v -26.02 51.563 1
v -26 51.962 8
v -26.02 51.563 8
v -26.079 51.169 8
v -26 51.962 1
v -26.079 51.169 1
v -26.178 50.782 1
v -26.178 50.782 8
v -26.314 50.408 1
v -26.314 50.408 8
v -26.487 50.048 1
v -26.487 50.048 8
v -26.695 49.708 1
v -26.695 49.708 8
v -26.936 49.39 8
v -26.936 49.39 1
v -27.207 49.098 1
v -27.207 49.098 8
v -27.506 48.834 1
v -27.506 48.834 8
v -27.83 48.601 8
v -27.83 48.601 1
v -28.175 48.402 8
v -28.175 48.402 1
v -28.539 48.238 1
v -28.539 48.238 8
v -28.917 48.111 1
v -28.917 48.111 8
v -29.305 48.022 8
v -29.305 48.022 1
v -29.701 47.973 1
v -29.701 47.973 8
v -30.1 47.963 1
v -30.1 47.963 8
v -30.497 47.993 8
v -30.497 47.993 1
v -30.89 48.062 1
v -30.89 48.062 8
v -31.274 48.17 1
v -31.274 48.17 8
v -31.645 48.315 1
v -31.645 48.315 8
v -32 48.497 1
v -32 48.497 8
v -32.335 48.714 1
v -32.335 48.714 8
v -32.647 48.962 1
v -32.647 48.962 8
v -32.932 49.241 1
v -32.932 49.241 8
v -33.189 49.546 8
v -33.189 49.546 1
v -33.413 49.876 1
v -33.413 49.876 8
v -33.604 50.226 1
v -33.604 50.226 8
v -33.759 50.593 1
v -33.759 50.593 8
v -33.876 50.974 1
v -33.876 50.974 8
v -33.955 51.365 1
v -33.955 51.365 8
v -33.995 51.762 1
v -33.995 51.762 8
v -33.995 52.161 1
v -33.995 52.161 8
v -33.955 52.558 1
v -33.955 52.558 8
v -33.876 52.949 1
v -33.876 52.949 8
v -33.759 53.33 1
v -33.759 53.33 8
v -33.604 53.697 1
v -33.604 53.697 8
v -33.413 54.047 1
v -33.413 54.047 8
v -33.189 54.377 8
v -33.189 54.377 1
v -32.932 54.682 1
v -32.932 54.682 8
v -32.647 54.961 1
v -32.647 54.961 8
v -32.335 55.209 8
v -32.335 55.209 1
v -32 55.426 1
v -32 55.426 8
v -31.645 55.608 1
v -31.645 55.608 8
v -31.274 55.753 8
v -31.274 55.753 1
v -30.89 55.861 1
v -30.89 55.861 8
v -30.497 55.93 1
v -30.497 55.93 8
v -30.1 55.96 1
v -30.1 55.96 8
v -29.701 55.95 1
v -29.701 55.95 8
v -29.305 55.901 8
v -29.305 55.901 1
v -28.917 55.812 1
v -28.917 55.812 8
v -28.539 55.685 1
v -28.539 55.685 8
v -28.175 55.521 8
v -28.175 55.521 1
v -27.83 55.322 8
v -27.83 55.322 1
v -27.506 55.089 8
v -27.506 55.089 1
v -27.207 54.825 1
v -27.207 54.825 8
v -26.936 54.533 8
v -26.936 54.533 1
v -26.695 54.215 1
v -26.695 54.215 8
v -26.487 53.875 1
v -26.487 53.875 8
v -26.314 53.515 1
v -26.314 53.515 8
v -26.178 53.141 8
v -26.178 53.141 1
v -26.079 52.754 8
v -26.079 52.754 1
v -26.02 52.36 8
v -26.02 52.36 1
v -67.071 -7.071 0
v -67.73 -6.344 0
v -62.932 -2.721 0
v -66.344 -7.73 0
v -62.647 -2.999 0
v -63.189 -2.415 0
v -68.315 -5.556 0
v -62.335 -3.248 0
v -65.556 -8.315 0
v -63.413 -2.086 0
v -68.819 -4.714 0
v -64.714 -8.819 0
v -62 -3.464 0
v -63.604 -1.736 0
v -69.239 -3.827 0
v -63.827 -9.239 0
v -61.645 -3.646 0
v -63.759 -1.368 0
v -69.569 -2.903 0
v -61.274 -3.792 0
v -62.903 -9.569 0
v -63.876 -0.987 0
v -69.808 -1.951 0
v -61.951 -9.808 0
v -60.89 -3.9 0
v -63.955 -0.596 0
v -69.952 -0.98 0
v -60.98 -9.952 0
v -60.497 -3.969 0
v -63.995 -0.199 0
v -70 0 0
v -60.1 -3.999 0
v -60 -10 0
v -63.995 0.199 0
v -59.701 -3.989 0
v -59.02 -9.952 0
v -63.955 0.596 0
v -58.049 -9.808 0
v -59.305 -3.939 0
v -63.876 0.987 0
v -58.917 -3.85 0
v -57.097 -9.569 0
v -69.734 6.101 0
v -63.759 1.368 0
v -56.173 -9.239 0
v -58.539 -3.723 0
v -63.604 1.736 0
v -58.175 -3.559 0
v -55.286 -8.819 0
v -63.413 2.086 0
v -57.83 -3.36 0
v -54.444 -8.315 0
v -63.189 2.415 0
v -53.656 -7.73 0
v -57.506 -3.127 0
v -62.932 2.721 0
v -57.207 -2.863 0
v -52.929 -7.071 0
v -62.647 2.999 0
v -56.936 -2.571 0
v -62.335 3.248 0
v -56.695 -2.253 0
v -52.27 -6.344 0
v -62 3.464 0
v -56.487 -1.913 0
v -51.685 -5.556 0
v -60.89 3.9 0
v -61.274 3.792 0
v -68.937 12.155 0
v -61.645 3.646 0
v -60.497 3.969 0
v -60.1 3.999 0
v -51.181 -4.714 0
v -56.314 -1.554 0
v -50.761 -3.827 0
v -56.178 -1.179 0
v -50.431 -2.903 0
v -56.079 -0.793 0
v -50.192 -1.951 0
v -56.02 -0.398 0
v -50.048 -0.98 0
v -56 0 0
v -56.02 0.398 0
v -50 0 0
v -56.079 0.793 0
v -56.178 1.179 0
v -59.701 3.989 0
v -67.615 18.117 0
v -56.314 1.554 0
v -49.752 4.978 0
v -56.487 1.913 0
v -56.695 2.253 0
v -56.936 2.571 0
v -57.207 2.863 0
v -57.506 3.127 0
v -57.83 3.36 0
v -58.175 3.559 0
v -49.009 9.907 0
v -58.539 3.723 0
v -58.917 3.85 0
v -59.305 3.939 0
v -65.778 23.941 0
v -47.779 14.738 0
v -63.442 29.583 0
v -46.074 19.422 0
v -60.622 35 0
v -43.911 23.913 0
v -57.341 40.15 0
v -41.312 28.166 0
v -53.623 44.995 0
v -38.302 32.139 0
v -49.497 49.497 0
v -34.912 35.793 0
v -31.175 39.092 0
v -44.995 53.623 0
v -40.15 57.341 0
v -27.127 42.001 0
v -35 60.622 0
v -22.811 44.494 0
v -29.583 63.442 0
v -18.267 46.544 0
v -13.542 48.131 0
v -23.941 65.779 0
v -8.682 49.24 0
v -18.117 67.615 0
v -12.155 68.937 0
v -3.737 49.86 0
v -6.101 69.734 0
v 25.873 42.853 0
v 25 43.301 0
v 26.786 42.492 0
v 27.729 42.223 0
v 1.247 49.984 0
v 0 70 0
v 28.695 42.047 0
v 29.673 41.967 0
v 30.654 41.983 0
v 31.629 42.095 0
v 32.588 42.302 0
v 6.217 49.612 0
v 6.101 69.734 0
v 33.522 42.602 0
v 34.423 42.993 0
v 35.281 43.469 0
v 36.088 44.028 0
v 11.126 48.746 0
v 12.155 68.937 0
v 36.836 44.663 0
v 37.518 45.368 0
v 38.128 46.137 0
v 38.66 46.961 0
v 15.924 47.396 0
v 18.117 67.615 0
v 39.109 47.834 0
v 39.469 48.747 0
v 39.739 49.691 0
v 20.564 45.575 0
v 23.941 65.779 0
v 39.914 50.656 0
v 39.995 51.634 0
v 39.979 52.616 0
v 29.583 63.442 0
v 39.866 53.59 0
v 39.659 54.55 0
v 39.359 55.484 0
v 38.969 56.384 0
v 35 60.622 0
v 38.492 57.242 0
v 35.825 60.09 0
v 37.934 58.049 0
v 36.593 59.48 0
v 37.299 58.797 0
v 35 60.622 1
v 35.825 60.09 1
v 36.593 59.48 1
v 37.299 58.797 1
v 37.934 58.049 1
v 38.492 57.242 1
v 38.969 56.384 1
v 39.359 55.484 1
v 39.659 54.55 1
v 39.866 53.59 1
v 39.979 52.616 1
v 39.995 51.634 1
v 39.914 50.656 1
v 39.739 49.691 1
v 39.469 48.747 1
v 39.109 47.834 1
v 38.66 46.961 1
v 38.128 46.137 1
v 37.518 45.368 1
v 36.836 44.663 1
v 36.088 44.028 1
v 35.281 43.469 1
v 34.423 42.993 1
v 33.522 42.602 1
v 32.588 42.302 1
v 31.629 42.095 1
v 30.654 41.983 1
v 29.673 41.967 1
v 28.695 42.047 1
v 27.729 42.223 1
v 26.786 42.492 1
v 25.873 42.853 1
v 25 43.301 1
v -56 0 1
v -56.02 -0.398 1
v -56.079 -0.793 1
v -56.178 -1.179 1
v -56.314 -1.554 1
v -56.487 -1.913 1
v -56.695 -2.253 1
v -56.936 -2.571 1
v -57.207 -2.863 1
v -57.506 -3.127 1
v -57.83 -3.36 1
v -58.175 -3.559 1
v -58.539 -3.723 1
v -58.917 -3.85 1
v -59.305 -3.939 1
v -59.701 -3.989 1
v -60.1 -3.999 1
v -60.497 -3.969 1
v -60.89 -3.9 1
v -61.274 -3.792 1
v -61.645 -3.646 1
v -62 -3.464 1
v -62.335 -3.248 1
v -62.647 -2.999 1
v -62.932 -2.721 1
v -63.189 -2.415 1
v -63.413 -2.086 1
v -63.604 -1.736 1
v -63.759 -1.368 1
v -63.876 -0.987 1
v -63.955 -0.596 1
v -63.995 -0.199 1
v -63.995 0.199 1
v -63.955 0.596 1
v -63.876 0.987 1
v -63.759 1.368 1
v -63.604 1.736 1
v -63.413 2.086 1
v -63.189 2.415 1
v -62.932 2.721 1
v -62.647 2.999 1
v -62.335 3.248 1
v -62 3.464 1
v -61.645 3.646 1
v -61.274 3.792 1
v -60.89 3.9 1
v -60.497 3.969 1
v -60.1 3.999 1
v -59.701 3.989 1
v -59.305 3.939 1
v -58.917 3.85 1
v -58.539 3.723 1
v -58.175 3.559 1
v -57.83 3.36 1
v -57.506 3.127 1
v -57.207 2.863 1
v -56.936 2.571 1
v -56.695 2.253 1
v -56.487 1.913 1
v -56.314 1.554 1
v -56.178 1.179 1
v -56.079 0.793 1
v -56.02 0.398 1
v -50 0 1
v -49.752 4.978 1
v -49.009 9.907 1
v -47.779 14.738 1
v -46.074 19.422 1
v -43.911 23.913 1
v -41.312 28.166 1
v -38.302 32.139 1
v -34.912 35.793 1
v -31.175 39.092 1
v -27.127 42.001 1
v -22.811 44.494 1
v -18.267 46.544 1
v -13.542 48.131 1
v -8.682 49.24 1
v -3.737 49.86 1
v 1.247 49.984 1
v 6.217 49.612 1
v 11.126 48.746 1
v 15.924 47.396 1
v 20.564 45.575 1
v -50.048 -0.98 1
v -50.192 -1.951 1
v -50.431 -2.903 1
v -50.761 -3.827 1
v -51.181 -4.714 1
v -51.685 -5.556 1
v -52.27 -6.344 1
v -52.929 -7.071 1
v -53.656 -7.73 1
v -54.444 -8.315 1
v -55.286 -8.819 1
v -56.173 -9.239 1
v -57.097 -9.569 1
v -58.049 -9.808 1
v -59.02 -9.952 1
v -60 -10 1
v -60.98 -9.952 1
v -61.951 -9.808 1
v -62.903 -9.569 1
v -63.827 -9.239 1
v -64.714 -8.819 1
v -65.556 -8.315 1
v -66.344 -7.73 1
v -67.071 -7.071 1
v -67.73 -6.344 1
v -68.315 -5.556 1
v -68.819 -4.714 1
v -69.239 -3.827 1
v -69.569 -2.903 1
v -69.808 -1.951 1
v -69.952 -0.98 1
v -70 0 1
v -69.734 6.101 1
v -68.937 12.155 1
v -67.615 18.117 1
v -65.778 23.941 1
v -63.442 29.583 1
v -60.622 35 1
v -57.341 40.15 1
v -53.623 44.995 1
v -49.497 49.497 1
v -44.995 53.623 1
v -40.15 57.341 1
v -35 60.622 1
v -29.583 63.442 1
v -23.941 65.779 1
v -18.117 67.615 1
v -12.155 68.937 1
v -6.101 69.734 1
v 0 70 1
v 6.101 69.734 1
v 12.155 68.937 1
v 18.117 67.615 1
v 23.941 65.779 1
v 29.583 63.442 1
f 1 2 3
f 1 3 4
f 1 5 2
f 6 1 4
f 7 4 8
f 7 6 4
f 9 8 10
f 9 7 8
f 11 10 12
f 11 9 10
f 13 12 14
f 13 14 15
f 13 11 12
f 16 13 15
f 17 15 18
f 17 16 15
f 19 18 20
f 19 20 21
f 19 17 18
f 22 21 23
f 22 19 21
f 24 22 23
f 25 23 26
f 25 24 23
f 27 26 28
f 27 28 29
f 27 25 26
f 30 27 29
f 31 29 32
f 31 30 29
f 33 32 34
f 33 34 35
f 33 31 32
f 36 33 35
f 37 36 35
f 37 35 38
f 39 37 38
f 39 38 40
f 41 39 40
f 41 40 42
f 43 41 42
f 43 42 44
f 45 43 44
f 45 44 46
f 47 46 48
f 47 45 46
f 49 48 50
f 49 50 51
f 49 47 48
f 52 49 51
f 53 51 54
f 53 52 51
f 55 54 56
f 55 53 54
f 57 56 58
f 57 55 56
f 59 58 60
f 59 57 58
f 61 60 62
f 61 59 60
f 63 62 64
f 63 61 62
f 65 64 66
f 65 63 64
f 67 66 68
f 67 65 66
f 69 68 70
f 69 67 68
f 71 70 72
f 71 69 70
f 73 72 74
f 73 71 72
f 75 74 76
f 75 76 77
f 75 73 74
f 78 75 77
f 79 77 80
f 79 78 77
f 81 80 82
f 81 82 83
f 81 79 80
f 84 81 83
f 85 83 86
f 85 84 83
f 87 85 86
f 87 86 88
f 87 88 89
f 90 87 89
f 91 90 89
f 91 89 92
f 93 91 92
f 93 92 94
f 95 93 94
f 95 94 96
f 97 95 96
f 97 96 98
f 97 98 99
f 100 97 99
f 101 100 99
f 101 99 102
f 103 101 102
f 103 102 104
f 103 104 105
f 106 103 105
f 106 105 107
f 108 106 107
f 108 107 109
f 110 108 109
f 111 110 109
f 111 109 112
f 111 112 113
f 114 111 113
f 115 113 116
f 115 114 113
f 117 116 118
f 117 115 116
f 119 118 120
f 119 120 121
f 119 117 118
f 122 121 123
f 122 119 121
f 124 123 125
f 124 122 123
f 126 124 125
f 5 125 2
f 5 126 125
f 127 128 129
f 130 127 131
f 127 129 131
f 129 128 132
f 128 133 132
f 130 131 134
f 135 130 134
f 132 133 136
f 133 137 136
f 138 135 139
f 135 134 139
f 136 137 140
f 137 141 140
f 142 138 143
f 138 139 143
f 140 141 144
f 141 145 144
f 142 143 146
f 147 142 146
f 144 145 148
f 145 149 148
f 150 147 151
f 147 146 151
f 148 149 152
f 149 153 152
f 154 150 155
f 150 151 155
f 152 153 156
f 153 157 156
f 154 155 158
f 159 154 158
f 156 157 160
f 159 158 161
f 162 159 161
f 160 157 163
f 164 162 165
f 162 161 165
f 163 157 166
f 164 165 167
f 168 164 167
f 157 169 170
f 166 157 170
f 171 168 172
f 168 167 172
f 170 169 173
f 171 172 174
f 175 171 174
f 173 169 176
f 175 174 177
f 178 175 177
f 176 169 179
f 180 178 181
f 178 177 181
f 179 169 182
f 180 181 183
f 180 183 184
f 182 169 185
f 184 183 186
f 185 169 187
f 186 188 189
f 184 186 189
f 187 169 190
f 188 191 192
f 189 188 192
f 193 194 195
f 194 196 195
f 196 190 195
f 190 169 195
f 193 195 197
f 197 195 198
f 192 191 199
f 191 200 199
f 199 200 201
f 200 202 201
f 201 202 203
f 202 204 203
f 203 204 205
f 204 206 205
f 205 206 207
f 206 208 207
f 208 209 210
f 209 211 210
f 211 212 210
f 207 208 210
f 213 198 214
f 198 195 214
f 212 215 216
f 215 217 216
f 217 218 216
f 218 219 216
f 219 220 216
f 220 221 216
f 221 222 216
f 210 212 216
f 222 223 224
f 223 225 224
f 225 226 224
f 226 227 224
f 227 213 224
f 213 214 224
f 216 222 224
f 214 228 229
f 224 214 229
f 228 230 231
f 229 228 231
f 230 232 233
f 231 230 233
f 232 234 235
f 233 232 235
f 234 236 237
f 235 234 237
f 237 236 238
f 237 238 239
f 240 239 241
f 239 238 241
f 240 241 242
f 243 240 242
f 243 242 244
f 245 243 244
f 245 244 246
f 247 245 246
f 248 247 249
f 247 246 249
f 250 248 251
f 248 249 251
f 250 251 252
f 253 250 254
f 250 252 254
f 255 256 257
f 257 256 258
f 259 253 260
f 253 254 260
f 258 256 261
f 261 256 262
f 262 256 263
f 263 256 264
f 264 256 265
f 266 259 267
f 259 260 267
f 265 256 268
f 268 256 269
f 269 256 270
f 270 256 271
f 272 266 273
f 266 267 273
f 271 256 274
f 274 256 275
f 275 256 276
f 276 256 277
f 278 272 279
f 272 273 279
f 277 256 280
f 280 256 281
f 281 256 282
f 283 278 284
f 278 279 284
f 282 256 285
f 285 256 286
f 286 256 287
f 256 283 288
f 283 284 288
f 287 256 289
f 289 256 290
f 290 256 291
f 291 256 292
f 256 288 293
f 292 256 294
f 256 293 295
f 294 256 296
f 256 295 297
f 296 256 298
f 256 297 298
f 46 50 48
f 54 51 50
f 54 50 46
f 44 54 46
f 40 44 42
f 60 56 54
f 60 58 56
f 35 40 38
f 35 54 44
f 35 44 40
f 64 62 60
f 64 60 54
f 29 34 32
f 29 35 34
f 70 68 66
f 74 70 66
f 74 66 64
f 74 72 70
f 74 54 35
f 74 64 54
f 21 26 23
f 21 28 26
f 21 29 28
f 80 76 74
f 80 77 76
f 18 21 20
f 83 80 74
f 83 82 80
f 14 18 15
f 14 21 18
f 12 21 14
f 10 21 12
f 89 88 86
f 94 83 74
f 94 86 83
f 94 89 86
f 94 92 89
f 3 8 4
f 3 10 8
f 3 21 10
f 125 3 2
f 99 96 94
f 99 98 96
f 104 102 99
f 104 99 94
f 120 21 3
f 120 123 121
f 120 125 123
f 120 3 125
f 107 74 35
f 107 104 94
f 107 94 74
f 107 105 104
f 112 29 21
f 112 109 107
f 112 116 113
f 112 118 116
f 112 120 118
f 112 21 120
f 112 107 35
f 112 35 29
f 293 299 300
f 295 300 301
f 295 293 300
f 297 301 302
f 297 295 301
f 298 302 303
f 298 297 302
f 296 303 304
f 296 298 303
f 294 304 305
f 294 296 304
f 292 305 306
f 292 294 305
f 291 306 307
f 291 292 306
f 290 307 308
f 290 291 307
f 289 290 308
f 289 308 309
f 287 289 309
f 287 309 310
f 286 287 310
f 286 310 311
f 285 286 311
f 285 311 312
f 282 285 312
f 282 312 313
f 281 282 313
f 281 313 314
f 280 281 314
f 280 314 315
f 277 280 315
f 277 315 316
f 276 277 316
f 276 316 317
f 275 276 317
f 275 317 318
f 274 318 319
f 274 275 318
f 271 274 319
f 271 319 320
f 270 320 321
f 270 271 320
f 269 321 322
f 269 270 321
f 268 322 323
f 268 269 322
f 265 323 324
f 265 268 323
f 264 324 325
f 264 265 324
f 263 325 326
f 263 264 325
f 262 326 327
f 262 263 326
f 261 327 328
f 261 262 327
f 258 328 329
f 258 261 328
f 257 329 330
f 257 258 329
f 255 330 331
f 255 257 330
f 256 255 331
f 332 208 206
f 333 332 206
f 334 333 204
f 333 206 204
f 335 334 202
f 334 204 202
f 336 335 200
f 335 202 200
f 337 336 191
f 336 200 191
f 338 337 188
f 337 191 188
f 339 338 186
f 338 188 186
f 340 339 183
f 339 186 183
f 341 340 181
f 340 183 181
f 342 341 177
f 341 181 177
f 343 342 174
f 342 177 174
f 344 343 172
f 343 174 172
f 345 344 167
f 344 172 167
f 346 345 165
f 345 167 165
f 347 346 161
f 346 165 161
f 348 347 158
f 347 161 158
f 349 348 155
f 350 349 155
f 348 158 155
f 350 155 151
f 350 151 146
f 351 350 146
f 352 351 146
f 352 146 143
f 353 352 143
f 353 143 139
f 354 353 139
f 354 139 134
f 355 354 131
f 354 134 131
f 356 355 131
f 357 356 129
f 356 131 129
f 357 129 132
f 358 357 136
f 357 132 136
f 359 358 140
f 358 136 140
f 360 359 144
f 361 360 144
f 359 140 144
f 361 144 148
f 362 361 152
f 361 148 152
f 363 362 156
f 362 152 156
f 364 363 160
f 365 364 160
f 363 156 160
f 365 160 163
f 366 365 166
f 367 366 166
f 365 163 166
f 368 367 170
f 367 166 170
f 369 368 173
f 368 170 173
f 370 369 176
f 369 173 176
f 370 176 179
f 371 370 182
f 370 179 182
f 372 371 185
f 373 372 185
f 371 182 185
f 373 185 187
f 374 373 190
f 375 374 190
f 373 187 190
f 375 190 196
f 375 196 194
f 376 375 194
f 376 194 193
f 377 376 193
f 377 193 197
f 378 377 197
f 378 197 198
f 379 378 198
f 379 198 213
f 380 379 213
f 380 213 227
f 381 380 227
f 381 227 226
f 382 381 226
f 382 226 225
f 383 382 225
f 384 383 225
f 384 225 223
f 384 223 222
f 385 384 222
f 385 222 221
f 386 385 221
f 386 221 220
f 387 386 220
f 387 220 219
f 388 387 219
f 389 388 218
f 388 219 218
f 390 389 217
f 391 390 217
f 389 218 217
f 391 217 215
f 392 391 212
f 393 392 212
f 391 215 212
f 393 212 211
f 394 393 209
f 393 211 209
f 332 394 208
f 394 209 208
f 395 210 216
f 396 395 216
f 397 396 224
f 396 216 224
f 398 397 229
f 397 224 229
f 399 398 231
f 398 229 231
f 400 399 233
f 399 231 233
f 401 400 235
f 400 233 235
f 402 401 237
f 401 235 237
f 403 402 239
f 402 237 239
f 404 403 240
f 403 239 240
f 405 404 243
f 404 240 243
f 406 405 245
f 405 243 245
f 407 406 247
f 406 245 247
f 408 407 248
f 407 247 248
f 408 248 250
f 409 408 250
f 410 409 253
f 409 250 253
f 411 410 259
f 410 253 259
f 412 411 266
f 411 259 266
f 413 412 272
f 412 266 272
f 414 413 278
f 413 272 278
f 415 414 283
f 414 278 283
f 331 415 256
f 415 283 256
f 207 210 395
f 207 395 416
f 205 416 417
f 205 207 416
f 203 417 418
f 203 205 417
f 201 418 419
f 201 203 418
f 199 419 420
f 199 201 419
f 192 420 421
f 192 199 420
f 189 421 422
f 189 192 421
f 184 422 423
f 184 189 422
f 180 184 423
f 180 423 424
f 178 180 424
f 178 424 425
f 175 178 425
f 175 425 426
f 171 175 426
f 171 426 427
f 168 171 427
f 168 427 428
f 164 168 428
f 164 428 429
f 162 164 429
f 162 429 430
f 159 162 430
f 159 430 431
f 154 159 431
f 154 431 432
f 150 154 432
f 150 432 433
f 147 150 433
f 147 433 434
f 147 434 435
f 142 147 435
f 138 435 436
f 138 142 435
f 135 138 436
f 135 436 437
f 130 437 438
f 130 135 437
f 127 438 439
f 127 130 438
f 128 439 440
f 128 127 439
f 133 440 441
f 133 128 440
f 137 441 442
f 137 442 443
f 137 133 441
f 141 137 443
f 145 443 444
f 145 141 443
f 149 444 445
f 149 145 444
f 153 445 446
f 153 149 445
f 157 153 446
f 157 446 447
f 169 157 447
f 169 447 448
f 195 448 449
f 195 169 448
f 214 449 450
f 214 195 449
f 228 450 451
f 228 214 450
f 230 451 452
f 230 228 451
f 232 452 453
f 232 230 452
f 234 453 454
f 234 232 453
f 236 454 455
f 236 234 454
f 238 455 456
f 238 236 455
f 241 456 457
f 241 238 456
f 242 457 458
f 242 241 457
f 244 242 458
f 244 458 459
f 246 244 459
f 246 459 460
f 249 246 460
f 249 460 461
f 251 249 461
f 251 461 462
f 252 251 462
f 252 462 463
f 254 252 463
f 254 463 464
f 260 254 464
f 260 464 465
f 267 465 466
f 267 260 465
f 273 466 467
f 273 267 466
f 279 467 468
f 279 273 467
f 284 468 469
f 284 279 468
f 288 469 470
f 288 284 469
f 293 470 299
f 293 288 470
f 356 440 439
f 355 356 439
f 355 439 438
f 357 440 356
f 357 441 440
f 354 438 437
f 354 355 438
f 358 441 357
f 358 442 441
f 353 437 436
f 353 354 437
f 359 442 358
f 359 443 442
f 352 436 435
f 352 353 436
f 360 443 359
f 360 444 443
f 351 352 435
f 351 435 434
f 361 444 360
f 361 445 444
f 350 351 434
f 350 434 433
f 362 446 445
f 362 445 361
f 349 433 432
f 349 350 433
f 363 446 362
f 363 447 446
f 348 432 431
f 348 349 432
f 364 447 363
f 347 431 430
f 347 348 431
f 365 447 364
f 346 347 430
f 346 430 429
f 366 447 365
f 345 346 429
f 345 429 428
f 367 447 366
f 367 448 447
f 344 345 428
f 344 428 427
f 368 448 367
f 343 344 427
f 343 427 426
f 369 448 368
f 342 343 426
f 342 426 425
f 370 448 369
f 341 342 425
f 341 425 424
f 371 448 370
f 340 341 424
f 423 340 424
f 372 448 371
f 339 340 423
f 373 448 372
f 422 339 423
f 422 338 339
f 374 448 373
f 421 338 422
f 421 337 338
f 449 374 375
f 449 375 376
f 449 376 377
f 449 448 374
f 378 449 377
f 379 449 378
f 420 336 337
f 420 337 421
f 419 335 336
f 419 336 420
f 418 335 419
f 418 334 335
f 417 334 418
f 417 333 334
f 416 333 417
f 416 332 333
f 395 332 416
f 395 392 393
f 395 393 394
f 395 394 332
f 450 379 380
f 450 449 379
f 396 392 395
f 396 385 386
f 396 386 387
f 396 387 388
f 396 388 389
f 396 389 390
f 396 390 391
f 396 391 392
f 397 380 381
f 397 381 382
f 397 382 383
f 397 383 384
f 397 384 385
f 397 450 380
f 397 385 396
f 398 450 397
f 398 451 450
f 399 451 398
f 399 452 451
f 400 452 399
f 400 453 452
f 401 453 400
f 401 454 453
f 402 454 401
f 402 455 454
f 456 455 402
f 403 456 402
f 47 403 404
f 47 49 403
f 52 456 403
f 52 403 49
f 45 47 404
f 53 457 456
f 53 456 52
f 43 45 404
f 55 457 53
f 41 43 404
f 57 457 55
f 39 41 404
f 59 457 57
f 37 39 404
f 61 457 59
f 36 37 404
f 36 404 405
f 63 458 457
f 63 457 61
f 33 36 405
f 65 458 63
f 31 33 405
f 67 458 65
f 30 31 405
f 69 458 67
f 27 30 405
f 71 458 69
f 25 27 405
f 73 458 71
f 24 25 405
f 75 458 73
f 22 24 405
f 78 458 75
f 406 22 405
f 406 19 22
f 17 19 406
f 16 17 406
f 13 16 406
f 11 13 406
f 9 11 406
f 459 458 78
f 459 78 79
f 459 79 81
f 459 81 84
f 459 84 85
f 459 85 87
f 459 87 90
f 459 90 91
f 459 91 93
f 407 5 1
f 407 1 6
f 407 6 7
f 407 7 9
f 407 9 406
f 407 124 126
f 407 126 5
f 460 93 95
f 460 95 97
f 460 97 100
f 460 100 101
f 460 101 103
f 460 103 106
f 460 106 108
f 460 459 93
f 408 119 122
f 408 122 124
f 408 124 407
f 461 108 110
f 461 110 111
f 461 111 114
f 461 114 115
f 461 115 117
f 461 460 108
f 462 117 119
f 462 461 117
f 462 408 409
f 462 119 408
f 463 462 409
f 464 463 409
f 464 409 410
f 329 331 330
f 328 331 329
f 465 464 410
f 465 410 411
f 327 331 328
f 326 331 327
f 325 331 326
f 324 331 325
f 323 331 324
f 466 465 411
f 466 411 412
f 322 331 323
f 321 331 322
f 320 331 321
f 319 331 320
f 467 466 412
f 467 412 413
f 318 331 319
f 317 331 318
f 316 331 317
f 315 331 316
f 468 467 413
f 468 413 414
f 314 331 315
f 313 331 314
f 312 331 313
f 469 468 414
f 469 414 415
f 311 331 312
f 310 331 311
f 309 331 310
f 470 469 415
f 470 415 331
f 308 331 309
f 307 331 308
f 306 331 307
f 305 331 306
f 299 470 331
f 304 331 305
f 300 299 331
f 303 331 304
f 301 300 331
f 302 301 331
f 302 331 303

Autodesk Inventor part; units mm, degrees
ref_plane "YZ Plane" through (0, 0, 0) normal (1, 0, 0) x (0, 1, 0)
ref_plane "XZ Plane" through (0, 0, 0) normal (0, 1, 0) x (-1, 0, 0)
ref_plane "XY Plane" through (0, 0, 0) normal (0, 0, 1) x (1, 0, 0)
sketch "Sketch1" plane through (0, 0, 0) normal (0, 0, 1) x (1, 0, 0)
  circle A0 centre (0, 0) radius 50 construction
  line L0 (0, 0) -> (-60, 0)
  circle A1 centre (-60, 0) radius 10
  line L1 (0, 0) -> (-23.6561, 40.9735) construction
  line L2 (0, 0) -> (-50, 0) construction
  line L3 (0, 0) -> (-25, -43.3013)
  line L4 (0, 0) -> (50, 0) construction
  line L5 (0, 0) -> (65, 0) construction
  line L6 (0, 0) -> (30, 51.9615)
  line L7 (0, 0) -> (60, 0) construction
  circle A2 centre (30, 51.9615) radius 10
  arc A3 (35, 60.6218) -> (-70, 0) centre (0, 0) ccw
  arc A4 (25, 43.3013) -> (-50, 0) centre (0, 0) ccw
  line L8 (0, 0) -> (25, 43.3013) construction
  line L9 (0, 0) -> (-50, 0) construction
  line L10 (-60, 0) -> (-63.75, -6.4952)
  line L11 (-60, 0) -> (-52.5, 0) construction
  circle A5 centre (-60, 0) radius 4
  circle A6 centre (-63.75, -6.4952) radius 2.5
  circle A7 centre (0, 0) radius 75 construction
  line L12 (0, 0) -> (-75, 0) construction
  circle A8 centre (-75, 0) radius 5
  line L13 (-25, 43.3013) -> (-35, 60.6218)
  line L14 (0, 0) -> (70, 0) construction
  circle A9 centre (-30, 51.9615) radius 4
  point P0 (25, 43.3013)
  point P1 (-62, -3.4641)
  point P2 (-56, 0)
  dimension "d14" = 20
  dimension "d23" = 150
  dimension "d0" = 100
  dimension "d1" = 60
  dimension "d2" = 20
  dimension "d3" = 60
  dimension "d4" = 120
  dimension "d12" = 60
  dimension "d13" = 60
  dimension "d15" = 120
  dimension "d19" = 7.5
  dimension "d20" = 120
  dimension "d21" = 8
  dimension "d22" = 5
  dimension "d24" = 10
  dimension "d25" = 120
  dimension "d26" = 60
  dimension "d27" = 8
extrude "Extrusion1" add sketch "Sketch1" along normal blind 1 contours A1 A6 L10 A5 L0 | L0 A5 L10 A6 A1 | A1 A3 L13 A9 A4 | A4 L13 A9 A3 A2 | A2 | A6 | A9 L13 | L13 A9
extrude "Extrusion2" add sketch "Sketch1" along normal blind 8 contours A9 L13 | L13 A9
